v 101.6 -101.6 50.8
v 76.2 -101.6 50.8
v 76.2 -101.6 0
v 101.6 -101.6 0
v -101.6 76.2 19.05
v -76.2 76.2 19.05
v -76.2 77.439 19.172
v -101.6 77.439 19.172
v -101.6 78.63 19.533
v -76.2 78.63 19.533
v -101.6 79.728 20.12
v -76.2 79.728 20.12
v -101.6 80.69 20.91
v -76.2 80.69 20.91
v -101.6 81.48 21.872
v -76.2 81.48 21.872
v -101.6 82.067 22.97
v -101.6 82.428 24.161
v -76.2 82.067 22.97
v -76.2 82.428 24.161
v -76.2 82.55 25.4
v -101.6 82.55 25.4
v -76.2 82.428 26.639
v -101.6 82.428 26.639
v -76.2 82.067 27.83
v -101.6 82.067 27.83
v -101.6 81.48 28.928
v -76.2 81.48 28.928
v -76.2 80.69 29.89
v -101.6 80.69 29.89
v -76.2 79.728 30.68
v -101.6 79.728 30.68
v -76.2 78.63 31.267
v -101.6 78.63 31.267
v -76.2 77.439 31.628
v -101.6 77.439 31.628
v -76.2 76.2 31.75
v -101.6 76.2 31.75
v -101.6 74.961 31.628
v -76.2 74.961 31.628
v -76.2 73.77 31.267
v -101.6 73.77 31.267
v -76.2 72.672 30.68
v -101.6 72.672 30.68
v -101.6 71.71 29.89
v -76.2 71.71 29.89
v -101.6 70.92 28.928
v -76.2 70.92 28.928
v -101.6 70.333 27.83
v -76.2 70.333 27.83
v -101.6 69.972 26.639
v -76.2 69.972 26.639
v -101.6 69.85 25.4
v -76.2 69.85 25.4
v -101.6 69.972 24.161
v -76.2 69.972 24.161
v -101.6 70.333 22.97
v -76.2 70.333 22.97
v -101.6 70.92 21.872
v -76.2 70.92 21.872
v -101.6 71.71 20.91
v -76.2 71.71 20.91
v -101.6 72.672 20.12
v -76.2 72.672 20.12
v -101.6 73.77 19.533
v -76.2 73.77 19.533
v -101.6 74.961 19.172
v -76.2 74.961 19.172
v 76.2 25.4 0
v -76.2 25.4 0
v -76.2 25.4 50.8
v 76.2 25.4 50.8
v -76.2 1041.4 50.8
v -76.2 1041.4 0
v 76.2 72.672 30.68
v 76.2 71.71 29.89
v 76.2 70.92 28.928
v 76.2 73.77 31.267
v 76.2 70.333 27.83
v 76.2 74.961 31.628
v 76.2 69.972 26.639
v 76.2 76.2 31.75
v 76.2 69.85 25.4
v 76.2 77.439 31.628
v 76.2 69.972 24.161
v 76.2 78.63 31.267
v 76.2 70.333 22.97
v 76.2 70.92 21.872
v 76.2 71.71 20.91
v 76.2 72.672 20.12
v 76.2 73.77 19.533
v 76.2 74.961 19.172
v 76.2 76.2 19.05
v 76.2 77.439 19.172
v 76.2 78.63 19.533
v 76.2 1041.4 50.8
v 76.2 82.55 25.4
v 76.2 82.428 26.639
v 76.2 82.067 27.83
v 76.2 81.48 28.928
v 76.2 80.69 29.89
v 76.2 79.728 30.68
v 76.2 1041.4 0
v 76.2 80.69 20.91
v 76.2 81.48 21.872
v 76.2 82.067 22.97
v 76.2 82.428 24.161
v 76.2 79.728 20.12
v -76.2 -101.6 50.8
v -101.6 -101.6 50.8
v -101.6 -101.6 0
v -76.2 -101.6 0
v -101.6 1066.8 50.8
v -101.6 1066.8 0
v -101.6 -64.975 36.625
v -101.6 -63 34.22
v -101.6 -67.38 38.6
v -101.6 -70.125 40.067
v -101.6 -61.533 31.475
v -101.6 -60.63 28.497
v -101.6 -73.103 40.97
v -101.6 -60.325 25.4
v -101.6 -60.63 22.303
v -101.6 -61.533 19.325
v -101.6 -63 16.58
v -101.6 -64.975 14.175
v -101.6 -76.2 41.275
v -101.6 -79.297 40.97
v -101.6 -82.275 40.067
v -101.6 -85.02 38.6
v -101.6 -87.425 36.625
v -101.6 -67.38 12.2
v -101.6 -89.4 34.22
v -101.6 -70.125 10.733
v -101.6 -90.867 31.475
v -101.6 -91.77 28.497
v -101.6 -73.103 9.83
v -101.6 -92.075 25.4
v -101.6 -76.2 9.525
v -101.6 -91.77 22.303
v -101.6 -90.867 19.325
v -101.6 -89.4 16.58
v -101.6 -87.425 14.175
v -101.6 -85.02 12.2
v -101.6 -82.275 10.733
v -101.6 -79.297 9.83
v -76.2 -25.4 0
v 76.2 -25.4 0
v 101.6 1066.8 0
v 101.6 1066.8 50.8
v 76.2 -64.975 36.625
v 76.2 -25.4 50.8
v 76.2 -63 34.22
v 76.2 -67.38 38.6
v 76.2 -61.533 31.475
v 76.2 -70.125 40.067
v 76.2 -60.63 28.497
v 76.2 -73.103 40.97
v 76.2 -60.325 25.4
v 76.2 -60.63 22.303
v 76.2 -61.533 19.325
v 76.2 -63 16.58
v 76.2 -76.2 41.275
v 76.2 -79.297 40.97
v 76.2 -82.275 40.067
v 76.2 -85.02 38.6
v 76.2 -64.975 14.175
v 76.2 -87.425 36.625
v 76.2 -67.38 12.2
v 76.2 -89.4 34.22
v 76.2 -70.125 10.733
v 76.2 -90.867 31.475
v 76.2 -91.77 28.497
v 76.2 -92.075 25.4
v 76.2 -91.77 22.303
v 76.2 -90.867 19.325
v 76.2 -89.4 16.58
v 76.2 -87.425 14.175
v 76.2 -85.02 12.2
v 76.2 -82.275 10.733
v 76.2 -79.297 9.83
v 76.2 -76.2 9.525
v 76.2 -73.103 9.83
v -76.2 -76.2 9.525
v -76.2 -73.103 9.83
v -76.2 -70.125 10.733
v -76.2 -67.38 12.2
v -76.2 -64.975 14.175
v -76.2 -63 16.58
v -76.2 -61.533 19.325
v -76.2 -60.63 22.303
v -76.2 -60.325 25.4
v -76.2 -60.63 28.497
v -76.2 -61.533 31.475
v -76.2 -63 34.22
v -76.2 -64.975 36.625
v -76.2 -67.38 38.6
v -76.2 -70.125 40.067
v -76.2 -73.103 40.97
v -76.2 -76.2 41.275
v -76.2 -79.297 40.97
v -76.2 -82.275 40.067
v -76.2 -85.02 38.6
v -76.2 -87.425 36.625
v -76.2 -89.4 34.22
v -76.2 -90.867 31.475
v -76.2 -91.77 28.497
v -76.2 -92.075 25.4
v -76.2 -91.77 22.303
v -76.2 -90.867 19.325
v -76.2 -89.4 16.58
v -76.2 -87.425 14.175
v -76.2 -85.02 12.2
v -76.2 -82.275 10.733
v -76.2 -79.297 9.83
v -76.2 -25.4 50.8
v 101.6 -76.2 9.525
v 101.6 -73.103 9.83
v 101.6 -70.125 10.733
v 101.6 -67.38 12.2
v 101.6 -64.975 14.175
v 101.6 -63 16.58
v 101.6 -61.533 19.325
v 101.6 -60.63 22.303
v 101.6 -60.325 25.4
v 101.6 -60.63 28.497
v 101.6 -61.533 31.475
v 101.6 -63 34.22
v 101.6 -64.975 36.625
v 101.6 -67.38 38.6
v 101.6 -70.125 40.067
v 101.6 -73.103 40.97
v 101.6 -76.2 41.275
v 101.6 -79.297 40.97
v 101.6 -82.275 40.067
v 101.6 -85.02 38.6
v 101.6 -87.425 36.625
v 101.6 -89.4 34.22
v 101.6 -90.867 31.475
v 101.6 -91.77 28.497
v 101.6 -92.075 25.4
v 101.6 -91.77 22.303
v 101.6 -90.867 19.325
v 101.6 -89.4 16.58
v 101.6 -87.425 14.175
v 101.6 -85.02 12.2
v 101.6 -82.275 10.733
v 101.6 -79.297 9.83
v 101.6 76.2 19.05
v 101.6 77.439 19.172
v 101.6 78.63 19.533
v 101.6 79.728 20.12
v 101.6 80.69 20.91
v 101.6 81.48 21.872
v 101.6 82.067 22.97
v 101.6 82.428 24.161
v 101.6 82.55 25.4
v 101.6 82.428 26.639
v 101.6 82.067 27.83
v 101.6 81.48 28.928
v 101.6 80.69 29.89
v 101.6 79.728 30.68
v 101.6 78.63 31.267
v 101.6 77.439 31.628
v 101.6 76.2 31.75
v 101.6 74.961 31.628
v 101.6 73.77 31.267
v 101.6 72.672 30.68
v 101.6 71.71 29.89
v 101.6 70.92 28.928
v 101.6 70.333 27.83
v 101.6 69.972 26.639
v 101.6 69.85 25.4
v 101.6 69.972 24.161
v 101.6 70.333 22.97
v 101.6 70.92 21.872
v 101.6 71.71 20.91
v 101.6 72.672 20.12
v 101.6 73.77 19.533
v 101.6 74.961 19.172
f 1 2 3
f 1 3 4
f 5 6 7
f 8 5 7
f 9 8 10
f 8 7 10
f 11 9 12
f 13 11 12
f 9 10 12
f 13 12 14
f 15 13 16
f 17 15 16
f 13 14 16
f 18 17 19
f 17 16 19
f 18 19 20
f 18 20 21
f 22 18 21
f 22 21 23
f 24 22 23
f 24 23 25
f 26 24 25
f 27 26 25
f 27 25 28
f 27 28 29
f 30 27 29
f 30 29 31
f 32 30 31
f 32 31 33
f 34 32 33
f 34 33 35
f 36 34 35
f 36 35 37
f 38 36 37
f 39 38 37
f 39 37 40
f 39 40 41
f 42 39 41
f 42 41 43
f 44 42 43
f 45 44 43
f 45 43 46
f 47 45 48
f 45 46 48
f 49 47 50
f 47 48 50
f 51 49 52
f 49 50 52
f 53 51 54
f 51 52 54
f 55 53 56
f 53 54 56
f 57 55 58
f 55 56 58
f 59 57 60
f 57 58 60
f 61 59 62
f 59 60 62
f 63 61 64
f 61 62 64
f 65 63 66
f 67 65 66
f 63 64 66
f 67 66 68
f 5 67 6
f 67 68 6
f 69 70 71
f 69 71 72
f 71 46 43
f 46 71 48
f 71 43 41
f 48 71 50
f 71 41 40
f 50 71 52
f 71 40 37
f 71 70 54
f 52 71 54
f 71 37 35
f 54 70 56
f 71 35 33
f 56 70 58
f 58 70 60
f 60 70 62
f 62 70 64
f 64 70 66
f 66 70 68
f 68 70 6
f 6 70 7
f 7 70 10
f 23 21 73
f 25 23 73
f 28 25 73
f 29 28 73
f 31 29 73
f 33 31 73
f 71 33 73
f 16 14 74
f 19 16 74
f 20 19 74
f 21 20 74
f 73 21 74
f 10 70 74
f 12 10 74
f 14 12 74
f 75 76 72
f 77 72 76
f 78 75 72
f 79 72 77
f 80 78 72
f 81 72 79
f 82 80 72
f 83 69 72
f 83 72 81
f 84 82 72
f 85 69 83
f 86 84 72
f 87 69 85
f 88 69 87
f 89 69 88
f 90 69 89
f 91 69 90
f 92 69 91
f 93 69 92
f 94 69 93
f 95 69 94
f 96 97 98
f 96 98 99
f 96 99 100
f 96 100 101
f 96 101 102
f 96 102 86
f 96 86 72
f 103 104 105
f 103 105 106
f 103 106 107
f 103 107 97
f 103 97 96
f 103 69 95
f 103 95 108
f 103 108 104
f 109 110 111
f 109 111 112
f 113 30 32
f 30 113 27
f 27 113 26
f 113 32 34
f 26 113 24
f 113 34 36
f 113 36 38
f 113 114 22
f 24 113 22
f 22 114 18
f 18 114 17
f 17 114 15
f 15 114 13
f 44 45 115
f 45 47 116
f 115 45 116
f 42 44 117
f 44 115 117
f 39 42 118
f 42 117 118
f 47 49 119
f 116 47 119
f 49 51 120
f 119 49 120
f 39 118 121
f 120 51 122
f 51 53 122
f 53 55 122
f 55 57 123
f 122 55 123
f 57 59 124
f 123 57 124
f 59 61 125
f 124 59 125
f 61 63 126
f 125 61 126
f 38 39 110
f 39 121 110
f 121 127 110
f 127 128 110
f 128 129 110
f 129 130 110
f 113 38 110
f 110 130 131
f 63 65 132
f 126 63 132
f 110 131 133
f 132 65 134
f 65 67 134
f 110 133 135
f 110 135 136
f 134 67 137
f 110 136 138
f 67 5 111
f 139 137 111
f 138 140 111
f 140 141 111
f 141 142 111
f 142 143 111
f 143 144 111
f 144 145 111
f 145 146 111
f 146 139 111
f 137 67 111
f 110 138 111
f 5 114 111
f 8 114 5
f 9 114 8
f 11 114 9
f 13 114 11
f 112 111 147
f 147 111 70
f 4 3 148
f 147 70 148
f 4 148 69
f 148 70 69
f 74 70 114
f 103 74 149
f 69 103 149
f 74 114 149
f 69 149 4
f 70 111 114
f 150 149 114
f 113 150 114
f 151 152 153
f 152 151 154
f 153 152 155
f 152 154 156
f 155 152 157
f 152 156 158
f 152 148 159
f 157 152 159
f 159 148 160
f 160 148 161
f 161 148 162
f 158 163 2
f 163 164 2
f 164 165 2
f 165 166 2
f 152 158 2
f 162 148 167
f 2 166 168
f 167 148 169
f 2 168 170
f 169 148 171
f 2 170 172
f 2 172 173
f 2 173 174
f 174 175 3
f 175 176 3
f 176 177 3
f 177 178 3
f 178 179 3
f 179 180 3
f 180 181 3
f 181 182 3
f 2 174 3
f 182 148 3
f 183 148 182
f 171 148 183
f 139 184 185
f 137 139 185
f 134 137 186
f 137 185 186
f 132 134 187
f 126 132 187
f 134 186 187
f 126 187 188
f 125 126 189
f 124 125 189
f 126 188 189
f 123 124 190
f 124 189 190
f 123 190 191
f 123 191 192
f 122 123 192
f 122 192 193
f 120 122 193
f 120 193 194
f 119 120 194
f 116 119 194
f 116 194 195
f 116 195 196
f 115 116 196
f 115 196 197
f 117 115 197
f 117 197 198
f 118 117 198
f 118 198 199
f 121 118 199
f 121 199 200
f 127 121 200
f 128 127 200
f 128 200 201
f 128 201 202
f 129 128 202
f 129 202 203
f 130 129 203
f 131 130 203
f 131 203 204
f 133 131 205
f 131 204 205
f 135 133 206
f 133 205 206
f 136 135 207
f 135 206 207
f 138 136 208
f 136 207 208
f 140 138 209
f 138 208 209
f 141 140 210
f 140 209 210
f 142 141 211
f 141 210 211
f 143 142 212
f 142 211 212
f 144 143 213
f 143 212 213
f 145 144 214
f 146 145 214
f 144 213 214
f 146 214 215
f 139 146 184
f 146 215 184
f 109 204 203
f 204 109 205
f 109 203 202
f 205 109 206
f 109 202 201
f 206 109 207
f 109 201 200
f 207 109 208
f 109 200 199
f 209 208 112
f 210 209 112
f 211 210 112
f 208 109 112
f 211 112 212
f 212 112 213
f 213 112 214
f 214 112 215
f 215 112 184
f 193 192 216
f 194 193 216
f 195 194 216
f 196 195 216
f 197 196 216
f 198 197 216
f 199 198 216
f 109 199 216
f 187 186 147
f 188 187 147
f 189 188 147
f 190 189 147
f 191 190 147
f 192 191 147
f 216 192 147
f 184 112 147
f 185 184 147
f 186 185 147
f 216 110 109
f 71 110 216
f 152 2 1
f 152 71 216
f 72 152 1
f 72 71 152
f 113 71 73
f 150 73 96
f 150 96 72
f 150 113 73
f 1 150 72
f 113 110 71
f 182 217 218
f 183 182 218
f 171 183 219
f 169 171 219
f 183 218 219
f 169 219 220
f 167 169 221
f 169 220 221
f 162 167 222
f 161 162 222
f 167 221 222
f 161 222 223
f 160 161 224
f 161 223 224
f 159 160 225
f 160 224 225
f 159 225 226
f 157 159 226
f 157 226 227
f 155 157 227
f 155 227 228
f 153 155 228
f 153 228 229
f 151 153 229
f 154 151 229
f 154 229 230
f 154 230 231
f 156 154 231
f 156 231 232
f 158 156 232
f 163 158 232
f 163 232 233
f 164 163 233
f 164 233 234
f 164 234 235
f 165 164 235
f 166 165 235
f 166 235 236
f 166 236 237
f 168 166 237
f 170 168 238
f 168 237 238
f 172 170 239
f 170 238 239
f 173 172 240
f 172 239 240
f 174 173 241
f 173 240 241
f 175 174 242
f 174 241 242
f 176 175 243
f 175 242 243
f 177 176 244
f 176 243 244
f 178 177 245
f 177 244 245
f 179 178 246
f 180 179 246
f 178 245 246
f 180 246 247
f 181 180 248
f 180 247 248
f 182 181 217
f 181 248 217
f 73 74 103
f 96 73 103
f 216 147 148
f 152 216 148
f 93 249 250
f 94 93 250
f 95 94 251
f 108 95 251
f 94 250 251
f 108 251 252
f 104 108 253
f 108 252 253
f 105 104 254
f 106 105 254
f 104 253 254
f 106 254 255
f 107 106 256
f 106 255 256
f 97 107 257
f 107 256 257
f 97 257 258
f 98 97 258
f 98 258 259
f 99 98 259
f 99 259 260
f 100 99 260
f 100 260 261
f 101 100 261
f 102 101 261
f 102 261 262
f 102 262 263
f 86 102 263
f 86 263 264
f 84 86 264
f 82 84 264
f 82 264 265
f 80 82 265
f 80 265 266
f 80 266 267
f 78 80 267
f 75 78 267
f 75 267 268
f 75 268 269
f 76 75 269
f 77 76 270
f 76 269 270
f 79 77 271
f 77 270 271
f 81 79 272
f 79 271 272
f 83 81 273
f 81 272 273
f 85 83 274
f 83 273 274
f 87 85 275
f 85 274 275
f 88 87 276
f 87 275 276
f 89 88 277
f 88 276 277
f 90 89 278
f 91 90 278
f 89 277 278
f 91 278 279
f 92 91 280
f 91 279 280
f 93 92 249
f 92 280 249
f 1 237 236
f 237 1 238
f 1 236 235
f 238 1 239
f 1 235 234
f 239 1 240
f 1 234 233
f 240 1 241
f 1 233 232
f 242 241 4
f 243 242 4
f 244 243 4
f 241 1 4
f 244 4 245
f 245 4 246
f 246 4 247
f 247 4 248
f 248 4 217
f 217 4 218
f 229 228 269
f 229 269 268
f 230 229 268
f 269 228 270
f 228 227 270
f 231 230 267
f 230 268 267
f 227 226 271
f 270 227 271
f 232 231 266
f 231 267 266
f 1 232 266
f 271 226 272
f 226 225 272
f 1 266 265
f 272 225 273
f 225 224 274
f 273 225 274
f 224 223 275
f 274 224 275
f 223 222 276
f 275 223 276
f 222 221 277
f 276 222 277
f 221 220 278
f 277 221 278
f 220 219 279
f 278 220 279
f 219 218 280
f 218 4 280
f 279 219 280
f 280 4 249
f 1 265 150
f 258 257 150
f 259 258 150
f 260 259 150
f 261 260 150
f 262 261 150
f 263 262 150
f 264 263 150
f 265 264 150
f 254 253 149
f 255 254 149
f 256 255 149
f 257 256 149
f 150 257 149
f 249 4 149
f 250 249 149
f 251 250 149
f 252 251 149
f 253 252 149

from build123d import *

# Parameters (mm, degrees)
SKETCH1_W           = 152.4
SKETCH1_H           = 1016
BOSS_EXTRUDE1_DEPTH = 50.8
SKETCH2_R           = 15.875
SKETCH2_R_2         = 6.35
CUT_EXTRUDE1_DEPTH  = 1088.167475599


with BuildPart() as part:
    # Sketch1 → Boss-Extrude1 (new body)
    with BuildSketch(Plane.XY):
        Polygon((-76.2, -25.4), (76.2, -25.4), (76.2, -101.6), (101.6, -101.6), (101.6, 1066.8), (-101.6, 1066.8), (-101.6, -101.6), (-76.2, -101.6), align=None)
        with Locations((0, 533.4)):
            Rectangle(SKETCH1_W, SKETCH1_H, mode=Mode.SUBTRACT)
    extrude(amount=BOSS_EXTRUDE1_DEPTH)

    # Sketch2 → Cut-Extrude1 (cut, through all)
    with BuildSketch(Plane(origin=(101.6, 0, 0), x_dir=(0, 0, -1), z_dir=(1, 0, 0))):
        with Locations((-25.4, -76.2)):
            Circle(SKETCH2_R)
        with Locations((-25.4, 76.2)):
            Circle(SKETCH2_R_2)
    extrude(amount=-CUT_EXTRUDE1_DEPTH, mode=Mode.SUBTRACT)


solid = part.part
